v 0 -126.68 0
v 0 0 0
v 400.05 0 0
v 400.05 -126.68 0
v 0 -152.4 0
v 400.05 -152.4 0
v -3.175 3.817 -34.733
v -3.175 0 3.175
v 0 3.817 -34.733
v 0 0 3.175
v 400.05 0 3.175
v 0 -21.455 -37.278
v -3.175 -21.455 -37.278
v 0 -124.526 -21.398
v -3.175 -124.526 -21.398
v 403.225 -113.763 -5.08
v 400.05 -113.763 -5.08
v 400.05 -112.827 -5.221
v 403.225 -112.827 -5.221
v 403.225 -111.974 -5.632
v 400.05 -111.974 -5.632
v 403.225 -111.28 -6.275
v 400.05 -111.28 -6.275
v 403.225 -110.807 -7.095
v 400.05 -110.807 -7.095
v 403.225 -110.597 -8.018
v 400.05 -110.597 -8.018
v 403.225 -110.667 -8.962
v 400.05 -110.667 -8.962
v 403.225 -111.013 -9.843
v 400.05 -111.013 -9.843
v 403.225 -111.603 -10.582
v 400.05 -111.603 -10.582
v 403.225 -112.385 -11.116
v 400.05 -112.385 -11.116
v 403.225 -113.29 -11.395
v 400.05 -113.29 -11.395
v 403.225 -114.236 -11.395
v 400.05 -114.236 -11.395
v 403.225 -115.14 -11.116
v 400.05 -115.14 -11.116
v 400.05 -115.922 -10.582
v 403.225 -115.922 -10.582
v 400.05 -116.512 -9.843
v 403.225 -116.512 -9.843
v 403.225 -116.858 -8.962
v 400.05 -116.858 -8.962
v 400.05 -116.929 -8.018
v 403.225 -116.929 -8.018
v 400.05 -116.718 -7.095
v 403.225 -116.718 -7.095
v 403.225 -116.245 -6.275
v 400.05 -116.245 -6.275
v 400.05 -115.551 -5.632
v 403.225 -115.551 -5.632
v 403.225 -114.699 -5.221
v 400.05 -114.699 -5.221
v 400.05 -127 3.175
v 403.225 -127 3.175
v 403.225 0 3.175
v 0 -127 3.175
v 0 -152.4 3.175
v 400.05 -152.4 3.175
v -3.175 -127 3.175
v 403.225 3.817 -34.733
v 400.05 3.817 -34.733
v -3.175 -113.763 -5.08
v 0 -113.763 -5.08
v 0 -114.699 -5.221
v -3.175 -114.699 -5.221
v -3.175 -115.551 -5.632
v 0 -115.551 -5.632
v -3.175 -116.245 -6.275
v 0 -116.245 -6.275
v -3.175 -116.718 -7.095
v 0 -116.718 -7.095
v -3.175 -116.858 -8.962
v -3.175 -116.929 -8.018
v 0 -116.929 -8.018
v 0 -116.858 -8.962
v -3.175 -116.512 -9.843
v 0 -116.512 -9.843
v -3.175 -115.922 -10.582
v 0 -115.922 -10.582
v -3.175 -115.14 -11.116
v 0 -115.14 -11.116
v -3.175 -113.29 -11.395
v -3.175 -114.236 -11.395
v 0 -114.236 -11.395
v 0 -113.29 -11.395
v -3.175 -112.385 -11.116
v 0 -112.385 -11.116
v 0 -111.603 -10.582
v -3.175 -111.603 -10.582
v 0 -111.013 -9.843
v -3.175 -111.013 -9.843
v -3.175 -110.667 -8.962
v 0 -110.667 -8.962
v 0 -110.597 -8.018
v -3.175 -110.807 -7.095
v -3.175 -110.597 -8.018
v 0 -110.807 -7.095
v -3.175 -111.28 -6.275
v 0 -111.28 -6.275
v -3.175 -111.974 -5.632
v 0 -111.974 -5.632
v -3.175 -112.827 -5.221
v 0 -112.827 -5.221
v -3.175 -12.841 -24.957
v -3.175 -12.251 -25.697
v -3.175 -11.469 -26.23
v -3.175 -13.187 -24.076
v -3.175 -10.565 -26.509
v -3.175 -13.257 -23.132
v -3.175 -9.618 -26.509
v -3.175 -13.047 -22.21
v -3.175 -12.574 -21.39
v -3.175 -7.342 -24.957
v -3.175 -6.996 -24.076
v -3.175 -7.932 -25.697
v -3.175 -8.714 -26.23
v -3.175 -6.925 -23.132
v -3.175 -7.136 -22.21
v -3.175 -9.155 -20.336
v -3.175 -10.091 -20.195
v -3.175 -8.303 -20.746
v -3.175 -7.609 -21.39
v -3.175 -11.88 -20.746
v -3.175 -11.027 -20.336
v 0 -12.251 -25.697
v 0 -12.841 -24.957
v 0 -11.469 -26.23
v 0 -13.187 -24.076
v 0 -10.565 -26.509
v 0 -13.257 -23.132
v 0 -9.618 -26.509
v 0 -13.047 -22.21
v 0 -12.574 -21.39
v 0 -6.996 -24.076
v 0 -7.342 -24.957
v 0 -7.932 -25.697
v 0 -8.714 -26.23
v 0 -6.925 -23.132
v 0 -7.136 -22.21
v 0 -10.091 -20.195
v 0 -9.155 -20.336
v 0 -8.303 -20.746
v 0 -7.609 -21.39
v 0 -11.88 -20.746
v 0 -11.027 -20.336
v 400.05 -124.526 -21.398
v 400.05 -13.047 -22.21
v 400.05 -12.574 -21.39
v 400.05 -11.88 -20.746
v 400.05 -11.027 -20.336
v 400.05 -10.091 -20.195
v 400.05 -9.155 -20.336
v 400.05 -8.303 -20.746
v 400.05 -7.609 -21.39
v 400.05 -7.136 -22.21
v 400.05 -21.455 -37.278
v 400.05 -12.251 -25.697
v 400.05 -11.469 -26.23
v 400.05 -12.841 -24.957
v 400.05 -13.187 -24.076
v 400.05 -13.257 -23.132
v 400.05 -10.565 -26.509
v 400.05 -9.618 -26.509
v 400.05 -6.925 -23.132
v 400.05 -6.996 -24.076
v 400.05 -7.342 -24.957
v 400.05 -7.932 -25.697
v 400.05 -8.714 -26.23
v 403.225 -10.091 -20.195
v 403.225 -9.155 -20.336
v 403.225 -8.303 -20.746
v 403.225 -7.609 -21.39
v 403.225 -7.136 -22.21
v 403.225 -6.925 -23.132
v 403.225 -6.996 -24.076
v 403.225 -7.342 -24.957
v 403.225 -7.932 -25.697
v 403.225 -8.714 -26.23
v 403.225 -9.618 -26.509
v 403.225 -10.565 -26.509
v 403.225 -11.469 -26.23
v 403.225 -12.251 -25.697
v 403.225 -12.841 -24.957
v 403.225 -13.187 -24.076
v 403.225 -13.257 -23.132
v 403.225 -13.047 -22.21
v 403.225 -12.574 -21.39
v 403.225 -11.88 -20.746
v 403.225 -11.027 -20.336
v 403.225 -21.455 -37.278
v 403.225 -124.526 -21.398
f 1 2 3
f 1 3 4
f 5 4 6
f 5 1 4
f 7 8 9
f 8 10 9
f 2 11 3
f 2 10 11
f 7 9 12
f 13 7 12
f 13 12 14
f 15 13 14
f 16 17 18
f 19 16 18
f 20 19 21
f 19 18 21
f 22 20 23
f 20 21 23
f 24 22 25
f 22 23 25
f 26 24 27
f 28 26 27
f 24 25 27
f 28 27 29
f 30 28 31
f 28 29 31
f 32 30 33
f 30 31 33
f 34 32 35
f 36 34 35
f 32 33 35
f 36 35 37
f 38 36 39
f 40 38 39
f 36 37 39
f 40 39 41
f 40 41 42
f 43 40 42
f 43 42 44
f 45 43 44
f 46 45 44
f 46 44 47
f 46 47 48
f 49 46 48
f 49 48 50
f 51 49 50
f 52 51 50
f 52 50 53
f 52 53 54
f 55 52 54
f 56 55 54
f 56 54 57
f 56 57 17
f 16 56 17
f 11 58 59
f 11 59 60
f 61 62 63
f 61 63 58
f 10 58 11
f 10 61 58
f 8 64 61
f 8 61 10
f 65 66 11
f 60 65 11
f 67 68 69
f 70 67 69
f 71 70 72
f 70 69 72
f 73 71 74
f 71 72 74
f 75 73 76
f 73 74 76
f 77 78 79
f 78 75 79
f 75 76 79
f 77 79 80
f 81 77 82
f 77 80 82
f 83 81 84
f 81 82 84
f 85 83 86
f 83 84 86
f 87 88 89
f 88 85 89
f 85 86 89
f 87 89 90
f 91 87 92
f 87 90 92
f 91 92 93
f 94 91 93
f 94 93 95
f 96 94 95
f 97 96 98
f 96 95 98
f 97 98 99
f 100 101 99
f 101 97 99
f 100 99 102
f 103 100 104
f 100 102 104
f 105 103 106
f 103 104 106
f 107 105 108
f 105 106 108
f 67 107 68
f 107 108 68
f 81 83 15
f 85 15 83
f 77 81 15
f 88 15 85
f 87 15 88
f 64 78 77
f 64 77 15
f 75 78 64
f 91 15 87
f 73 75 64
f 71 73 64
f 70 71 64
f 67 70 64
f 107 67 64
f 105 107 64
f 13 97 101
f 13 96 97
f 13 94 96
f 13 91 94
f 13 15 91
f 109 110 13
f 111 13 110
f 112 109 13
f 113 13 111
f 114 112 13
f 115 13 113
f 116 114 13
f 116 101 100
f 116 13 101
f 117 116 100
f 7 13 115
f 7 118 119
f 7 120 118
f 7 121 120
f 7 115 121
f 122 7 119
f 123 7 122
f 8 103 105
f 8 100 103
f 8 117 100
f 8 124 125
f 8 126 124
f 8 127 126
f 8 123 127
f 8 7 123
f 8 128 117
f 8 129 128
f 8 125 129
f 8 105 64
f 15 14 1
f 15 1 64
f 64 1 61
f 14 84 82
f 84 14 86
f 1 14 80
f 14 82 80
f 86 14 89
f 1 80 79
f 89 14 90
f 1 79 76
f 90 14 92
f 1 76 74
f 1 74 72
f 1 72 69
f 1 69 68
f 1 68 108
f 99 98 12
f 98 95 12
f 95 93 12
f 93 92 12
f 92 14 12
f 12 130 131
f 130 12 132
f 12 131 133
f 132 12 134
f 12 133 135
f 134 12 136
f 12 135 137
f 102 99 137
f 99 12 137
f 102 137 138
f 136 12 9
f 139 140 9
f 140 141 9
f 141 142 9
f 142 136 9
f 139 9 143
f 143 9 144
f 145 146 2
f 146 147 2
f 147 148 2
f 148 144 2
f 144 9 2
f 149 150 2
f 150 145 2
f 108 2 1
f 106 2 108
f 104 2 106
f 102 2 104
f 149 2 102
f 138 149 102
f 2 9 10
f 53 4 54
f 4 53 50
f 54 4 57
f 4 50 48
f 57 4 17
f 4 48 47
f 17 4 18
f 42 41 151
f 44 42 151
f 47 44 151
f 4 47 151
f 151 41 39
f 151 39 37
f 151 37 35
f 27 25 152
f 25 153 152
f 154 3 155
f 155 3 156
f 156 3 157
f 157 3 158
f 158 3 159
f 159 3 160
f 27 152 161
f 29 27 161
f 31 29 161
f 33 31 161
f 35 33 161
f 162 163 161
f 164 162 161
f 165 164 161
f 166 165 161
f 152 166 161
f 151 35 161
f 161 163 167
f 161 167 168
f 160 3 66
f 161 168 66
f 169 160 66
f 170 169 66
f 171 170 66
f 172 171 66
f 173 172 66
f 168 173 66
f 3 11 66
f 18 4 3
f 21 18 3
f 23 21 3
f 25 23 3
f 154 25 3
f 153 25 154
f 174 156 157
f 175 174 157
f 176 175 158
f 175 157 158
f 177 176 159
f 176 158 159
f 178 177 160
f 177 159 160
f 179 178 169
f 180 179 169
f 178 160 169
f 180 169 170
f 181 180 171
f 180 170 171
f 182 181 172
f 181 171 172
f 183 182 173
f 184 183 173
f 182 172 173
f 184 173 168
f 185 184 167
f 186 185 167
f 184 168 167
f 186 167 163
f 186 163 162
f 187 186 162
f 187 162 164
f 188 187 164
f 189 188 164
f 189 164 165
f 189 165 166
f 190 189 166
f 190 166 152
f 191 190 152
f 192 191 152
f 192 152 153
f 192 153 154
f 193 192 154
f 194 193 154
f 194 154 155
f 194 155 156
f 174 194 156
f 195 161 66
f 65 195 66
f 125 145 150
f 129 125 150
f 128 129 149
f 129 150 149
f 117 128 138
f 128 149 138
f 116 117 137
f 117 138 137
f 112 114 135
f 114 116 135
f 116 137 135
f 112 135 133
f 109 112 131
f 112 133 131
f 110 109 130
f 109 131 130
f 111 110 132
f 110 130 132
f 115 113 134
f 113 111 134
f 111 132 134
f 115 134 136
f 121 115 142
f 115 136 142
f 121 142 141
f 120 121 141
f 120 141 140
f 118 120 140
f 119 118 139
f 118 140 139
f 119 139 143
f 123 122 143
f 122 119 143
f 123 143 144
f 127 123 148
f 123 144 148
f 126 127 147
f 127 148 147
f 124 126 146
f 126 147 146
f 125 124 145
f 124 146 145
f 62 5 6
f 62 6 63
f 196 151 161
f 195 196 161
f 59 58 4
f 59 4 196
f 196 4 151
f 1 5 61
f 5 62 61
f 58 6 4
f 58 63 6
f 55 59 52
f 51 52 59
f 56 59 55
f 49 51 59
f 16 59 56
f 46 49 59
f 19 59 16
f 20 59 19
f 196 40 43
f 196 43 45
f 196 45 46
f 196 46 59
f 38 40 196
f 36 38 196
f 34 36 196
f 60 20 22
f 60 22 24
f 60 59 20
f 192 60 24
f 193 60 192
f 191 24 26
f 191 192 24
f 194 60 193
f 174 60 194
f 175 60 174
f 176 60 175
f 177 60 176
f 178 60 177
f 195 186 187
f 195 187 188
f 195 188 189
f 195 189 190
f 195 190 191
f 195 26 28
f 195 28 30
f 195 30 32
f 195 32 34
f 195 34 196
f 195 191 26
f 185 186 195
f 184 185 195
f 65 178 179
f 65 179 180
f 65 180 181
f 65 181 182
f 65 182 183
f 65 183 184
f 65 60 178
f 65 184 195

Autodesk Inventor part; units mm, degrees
ref_plane "YZ Plane" through (0, 0, 0) normal (1, 0, 0) x (0, 1, 0)
ref_plane "XZ Plane" through (0, 0, 0) normal (0, 1, 0) x (-1, 0, 0)
ref_plane "XY Plane" through (0, 0, 0) normal (0, 0, 1) x (1, 0, 0)
sketch "Sketch1" plane through (0, 0, 0) normal (1, 0, 0) x (0, 1, 0)
  line L0 (0, 0) -> (-152.4, 0)
  line L1 (-152.4, 0) -> (-152.4, 3.175)
  line L2 (-152.4, 3.175) -> (0, 3.175)
  line L3 (0, 3.175) -> (0, 0)
  dimension "d0" = 152.4
  dimension "d1" = 3.175
extrude "Extrusion1" add sketch "Sketch1" along normal blind 400.05
sketch "Sketch2" plane through (0, 0, 0) normal (-1, 0, 0) x (0, 0, 1)
  line L0 (0, 0) -> (3.175, 0) projected
  line L1 (3.175, 0) -> (-34.7333, 3.8172)
  line L2 (-34.7333, 3.8172) -> (-37.2781, -21.455)
  line L3 (-37.2781, -21.455) -> (-21.3975, -124.5257)
  line L4 (-21.3975, -124.5257) -> (3.175, -127)
  line L5 (3.175, -127) -> (3.175, 0)
  line L6 (0, -152.4) -> (0, 0) projected
  circle A0 centre (-8.255, -113.7628) radius 3.175
  line L7 (-21.3975, -124.5257) -> (3.175, -120.7397) construction
  line L8 (3.175, 0) -> (3.175, -152.4) projected
  circle A1 centre (-23.3696, -10.0913) radius 3.175
  dimension "d4" = 25.4
  dimension "d5" = 95.75
  dimension "d6" = 38.1
  dimension "d7" = 127
  dimension "d8" = 104.2869
  dimension "d9" = 6.35
  dimension "d11" = 11.43
  dimension "d12" = 8.636
  dimension "d15" = 12.7
  dimension "d16" = 6.35
  dimension "d17" = 12.7
extrude "Extrusion3" add sketch "Sketch2" along normal blind 3.175
ref_plane "Work Plane1" through (200.025, 0, 0) normal (-1, 0, 0) x (0, 0, 1)
mirror "Mirror1" about plane through (200.025, 0, 0) normal (-1, 0, 0) of "Extrusion3"
properties part number "15102898-16-P-0215" material "Aluminum 6061"
